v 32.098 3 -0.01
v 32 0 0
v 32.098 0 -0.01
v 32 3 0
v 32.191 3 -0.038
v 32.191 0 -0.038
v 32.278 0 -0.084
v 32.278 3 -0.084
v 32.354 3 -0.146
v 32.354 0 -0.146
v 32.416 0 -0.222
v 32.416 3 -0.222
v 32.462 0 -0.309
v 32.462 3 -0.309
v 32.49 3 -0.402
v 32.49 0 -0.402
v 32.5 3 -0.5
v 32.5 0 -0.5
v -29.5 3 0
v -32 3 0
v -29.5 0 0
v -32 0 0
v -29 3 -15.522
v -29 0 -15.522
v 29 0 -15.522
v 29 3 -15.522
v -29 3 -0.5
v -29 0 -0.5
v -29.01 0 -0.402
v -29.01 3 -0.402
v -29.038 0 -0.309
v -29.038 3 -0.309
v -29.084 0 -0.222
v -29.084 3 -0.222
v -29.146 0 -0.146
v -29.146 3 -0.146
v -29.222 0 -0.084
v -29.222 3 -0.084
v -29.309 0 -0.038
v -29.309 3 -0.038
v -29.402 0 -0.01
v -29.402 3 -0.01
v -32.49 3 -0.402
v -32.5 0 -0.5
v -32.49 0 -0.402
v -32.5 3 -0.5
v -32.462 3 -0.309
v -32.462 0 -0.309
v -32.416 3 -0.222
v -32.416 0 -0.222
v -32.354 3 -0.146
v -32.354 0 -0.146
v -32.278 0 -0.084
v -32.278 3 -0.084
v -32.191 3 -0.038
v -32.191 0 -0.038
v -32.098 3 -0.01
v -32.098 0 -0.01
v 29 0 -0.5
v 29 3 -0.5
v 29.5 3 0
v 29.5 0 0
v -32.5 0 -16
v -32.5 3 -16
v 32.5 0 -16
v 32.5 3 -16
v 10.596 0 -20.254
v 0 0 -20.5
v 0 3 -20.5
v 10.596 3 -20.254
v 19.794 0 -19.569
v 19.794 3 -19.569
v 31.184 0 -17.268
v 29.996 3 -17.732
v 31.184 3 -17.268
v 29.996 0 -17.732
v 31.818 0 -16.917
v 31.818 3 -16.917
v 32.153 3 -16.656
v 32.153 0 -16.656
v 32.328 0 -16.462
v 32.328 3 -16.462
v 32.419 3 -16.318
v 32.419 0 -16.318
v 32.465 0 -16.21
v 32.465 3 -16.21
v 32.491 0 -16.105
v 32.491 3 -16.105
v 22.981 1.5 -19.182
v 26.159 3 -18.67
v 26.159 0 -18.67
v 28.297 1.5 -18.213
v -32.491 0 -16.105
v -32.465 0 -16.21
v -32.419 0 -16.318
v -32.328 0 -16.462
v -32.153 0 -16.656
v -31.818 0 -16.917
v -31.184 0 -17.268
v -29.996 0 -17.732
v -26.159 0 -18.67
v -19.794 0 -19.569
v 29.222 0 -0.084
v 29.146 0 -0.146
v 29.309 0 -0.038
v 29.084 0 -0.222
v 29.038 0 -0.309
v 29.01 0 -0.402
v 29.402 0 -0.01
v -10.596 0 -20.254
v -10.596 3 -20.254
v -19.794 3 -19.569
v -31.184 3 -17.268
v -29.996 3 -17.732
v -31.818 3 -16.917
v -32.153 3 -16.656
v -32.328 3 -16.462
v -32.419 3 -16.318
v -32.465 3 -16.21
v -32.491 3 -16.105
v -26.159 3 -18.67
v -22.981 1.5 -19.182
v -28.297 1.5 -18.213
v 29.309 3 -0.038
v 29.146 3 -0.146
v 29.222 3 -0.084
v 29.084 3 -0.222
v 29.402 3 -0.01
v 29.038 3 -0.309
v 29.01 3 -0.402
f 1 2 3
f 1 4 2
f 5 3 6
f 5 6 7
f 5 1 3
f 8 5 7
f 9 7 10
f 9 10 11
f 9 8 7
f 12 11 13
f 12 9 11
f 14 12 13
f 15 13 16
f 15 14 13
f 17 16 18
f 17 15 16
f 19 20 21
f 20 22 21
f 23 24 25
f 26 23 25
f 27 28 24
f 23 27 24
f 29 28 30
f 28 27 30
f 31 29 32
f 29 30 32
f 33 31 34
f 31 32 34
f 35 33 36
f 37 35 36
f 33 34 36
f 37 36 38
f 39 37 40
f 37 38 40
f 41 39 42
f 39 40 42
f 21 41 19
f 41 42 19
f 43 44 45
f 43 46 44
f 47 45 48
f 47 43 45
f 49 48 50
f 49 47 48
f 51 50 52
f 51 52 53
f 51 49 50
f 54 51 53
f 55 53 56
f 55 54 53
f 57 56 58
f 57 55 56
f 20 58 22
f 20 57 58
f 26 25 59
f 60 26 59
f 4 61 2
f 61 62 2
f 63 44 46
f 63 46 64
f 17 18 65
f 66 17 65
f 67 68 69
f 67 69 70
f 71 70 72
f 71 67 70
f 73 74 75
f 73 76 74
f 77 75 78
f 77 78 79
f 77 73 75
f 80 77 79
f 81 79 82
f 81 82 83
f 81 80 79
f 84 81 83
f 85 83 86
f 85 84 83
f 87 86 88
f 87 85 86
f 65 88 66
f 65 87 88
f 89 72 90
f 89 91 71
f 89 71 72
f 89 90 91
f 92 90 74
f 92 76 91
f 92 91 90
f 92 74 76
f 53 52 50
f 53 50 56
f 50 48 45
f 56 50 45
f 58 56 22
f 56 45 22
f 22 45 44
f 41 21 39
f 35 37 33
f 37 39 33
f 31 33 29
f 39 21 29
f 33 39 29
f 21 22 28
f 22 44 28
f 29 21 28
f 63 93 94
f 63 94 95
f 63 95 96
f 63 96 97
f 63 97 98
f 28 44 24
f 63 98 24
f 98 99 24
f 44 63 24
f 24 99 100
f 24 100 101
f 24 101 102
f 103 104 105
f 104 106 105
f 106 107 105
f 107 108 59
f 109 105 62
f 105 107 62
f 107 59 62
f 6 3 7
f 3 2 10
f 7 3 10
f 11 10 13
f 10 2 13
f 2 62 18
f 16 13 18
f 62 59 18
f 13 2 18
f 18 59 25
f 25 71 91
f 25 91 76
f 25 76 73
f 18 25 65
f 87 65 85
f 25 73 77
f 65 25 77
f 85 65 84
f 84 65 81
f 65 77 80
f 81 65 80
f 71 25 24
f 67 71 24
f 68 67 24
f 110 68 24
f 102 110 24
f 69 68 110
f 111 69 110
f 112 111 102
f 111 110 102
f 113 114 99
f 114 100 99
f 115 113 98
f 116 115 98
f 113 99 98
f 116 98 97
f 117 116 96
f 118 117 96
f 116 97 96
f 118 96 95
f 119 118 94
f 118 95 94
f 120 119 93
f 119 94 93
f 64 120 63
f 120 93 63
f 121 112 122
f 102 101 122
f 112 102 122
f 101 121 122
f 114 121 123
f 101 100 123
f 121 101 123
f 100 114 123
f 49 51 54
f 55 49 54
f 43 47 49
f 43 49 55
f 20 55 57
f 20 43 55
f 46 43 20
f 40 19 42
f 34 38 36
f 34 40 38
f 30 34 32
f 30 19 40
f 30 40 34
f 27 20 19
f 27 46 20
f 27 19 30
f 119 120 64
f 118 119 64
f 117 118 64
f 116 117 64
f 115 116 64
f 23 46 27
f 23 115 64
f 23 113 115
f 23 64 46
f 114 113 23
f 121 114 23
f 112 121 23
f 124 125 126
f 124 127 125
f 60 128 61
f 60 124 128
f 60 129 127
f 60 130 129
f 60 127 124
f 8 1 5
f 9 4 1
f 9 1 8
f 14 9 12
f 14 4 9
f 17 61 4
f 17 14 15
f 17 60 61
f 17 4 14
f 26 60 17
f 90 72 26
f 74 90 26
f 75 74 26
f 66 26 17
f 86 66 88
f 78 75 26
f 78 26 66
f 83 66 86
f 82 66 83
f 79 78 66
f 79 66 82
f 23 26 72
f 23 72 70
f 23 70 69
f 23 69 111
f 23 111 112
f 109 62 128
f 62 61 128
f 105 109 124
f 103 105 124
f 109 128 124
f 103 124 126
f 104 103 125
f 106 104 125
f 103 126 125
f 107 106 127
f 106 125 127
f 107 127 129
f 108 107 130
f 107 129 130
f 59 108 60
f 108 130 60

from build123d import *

# Parameters (mm, degrees)
BOSS_EXTRUDE1_DEPTH = 3
CUT_EXTRUDE1_DEPTH  = 4.0000001
SKETCH3_R           = 1.0922
CUT_EXTRUDE2_DEPTH  = 4.0000001
FILLET1_R           = 5
FILLET2_R           = 0.5
CUT_EXTRUDE3_DEPTH  = 4.0000001
FILLET3_R           = 0.5


with BuildPart() as part:
    # Sketch1 → Boss-Extrude1 (new body)
    with BuildSketch(Plane(origin=(0, 0, 0), x_dir=(1, 0, 0), z_dir=(0, 1, 0))):
        with BuildLine():
            Line((0, 0), (-32.5, 0))
            Line((-32.5, 0), (-32.5, 16))
            add(Edge.make_bspline(
                [(0, 20.5), (-32.5, 20.5), (-32.5, 16)],
                knots=[4.71238898, 4.71238898, 4.71238898, 6.283185307, 6.283185307, 6.283185307], degree=2, weights=[1, 0.707106781, 1]))
            Line((0, 20.5), (0, 16))
            Line((0, 16), (0, 0))
        make_face()
    boss_extrude1 = extrude(amount=BOSS_EXTRUDE1_DEPTH)

    # Mirror1: Boss-Extrude1 across plane
    add(boss_extrude1.mirror(Plane(origin=(0, 3, -16), x_dir=(0, 0, 1), z_dir=(-1, 0, 0))))

    # Sketch2 → Cut-Extrude1 (cut, through all)
    with BuildSketch(Plane(origin=(0, 3, 0), x_dir=(1, 0, 0), z_dir=(0, 1, 0))):
        with BuildLine():
            Line((0, 10.25), (0, 12.5))
            add(Edge.make_bspline(
                [(0, 12.5), (-20.26, 12.5), (-20.26, 10.25)],
                knots=[4.71238898, 4.71238898, 4.71238898, 6.283185307, 6.283185307, 6.283185307], degree=2, weights=[1, 0.707106781, 1]))
            Line((-20.26, 10.25), (-20.26, 0))
            Line((-20.26, 0), (0, 0))
            Line((0, 0), (0, 10.25))
        make_face()
        with BuildLine():
            Line((20.26, 0), (20.26, 10.25))
            add(Edge.make_bspline(
                [(20.26, 10.25), (20.26, 12.5), (0, 12.5)],
                knots=[3.141592654, 3.141592654, 3.141592654, 4.71238898, 4.71238898, 4.71238898], degree=2, weights=[1, 0.707106781, 1]))
            Line((0, 12.5), (0, 10.25))
            Line((0, 10.25), (0, 0))
            Line((0, 0), (20.26, 0))
        make_face()
    extrude(amount=-CUT_EXTRUDE1_DEPTH, mode=Mode.SUBTRACT)

    # Sketch3 → Cut-Extrude2 (cut, through all)
    with BuildSketch(Plane.XZ):
        with Locations((25.46, -4.3615)):
            Circle(SKETCH3_R)
        with Locations((-25.34, -4.3615)):
            Circle(SKETCH3_R)
    extrude(amount=-CUT_EXTRUDE2_DEPTH, mode=Mode.SUBTRACT)

    # Fillet1
    fillet1_edges = [part.edges().sort_by_distance(p)[0] for p in [
        (20.26, 1.5, 0),
        (-20.26, 1.5, 0),
    ]]
    fillet(fillet1_edges, radius=FILLET1_R)

    # Fillet2
    fillet2_edges = [part.edges().sort_by_distance(p)[0] for p in [
        (32.5, 1.5, 0),
        (-32.5, 1.5, 0),
    ]]
    fillet(fillet2_edges, radius=FILLET2_R)

    # Sketch4 → Cut-Extrude3 (cut, through all)
    with BuildSketch(Plane.XZ):
        Polygon((29, -1.8215), (29, 0), (-29, 0), (-29, -1.8215), (-29, -15.5215), (29, -15.5215), align=None)
    extrude(amount=-CUT_EXTRUDE3_DEPTH, mode=Mode.SUBTRACT)

    # Fillet3
    fillet3_edges = [part.edges().sort_by_distance(p)[0] for p in [
        (-29, 1.5, 0),
        (29, 1.5, 0),
    ]]
    fillet(fillet3_edges, radius=FILLET3_R)


solid = part.part
